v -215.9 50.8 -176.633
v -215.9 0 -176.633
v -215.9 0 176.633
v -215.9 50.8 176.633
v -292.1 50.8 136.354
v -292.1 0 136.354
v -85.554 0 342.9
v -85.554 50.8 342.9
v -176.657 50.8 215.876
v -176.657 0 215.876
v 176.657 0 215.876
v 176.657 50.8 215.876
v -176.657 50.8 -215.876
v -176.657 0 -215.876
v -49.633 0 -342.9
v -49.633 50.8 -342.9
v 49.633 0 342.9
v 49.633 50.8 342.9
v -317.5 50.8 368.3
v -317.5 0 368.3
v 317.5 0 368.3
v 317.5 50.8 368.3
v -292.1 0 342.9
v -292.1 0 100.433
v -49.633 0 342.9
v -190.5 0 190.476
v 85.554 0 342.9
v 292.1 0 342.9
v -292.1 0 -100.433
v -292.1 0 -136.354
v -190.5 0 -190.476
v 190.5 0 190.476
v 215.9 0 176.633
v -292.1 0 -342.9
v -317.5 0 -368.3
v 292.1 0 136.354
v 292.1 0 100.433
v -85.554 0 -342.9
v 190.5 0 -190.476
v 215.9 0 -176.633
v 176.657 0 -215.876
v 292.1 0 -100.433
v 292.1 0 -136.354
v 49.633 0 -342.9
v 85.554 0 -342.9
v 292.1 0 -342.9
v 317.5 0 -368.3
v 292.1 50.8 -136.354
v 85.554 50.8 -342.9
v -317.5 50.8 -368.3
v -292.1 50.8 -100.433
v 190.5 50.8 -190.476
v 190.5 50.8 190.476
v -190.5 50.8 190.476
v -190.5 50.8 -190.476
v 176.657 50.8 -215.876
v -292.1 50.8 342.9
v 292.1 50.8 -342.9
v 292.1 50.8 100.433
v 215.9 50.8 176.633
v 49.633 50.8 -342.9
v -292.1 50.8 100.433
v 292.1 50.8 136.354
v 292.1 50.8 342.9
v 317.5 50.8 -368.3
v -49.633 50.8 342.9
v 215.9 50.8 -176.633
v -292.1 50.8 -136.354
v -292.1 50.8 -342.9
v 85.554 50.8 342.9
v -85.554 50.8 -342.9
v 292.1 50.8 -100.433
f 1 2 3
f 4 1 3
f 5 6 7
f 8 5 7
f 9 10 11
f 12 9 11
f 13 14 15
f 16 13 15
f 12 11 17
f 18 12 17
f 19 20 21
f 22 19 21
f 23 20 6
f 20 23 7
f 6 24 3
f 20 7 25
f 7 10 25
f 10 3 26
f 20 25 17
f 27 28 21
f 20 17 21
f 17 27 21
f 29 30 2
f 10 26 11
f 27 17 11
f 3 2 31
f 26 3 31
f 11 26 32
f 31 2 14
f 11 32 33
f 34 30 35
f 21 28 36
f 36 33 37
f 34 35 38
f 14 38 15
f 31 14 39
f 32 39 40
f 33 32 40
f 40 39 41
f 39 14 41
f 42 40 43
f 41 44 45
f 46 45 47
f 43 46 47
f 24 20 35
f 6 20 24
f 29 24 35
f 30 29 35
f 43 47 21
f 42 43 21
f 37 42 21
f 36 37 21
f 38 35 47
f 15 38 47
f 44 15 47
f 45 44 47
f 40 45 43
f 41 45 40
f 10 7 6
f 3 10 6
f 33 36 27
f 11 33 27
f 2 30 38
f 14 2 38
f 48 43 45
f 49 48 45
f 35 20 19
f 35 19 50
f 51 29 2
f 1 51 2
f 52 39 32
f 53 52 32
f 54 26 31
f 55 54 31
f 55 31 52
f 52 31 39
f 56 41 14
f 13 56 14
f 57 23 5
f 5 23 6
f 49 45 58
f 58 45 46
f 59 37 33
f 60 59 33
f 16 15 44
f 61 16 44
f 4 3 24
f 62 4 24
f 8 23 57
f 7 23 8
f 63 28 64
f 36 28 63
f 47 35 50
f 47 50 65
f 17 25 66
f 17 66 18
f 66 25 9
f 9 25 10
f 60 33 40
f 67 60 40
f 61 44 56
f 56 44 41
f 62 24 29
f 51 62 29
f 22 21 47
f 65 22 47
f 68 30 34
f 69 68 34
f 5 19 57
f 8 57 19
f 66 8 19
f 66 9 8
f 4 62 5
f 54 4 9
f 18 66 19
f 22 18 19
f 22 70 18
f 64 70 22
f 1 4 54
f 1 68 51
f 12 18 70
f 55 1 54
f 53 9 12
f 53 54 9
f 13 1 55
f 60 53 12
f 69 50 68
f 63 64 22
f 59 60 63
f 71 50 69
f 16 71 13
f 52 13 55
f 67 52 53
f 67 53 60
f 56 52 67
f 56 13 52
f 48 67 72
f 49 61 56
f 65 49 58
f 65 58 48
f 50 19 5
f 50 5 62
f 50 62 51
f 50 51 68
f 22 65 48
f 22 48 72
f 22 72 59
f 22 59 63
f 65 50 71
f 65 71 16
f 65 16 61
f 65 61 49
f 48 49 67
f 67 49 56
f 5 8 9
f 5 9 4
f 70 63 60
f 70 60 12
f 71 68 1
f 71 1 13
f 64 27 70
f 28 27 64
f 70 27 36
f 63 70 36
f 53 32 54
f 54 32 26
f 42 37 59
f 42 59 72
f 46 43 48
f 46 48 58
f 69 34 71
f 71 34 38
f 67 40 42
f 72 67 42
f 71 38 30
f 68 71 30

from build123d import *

# Parameters (mm, degrees)
SKETCH1_W           = 635
SKETCH1_H           = 736.6
SKETCH1_W_2         = 584.2
SKETCH1_H_2         = 685.8
BOSS_EXTRUDE1_DEPTH = 50.8


with BuildPart() as part:
    # Sketch1 → Boss-Extrude1 (new body)
    # profile 1 of 13: a face of its own
    with BuildSketch(Plane(origin=(0, 0, 0), x_dir=(1, 0, 0), z_dir=(0, 1, 0))):
        Rectangle(SKETCH1_W, SKETCH1_H)
        Rectangle(SKETCH1_W_2, SKETCH1_H_2, mode=Mode.SUBTRACT)
    # profile 2 of 13: a face of its own
    with BuildSketch(Plane(origin=(0, 0, 0), x_dir=(1, 0, 0), z_dir=(0, 1, 0))):
        Polygon((176.657, -215.876084731), (49.633084731, -342.9), (85.554109215, -342.9), (292.1, -136.354109215), (292.1, -100.433084731), (215.9, -176.633084731), (202.057, -190.476084731), (190.5, -202.033084731), align=None)
    # profile 3 of 13: a face of its own
    with BuildSketch(Plane(origin=(0, 0, 0), x_dir=(1, 0, 0), z_dir=(0, 1, 0))):
        Polygon((85.554109215, 342.9), (49.633084731, 342.9), (176.657, 215.876084731), (190.5, 202.033084731), (202.057, 190.476084731), (215.9, 176.633084731), (292.1, 100.433084731), (292.1, 136.354109215), align=None)
    # profile 4 of 13: a face of its own
    with BuildSketch(Plane(origin=(0, 0, 0), x_dir=(1, 0, 0), z_dir=(0, 1, 0))):
        Polygon((-85.554109215, 342.9), (-292.1, 136.354109215), (-292.1, 100.433084731), (-215.9, 176.633084731), (-202.057, 190.476084731), (-190.5, 202.033084731), (-176.657, 215.876084731), (-49.633084731, 342.9), align=None)
    # profile 5 of 13: a face of its own
    with BuildSketch(Plane(origin=(0, 0, 0), x_dir=(1, 0, 0), z_dir=(0, 1, 0))):
        Polygon((-215.9, -176.633084731), (-292.1, -100.433084731), (-292.1, -136.354109215), (-85.554109215, -342.9), (-49.633084731, -342.9), (-176.657, -215.876084731), (-190.5, -202.033084731), (-202.057, -190.476084731), align=None)
    # profile 6 of 13: a face of its own
    with BuildSketch(Plane(origin=(0, 0, 0), x_dir=(1, 0, 0), z_dir=(0, 1, 0))):
        Polygon((176.657, 215.876084731), (-176.657, 215.876084731), (-190.5, 202.033084731), (-190.5, 190.476084731), (190.5, 190.476084731), (190.5, 202.033084731), align=None)
    # profile 7 of 13: a face of its own
    with BuildSketch(Plane(origin=(0, 0, 0), x_dir=(1, 0, 0), z_dir=(0, 1, 0))):
        Polygon((-202.057, 190.476084731), (-215.9, 176.633084731), (-215.9, -176.633084731), (-202.057, -190.476084731), (-190.5, -190.476084731), (-190.5, 190.476084731), align=None)
    # profile 8 of 13: a face of its own
    with BuildSketch(Plane(origin=(0, 0, 0), x_dir=(1, 0, 0), z_dir=(0, 1, 0))):
        Polygon((202.057, 190.476084731), (190.5, 190.476084731), (190.5, -190.476084731), (202.057, -190.476084731), (215.9, -176.633084731), (215.9, 176.633084731), align=None)
    # profile 9 of 13: a face of its own
    with BuildSketch(Plane(origin=(0, 0, 0), x_dir=(1, 0, 0), z_dir=(0, 1, 0))):
        Polygon((-190.5, -190.476084731), (-190.5, -202.033084731), (-176.657, -215.876084731), (176.657, -215.876084731), (190.5, -202.033084731), (190.5, -190.476084731), align=None)
    # profile 10 of 13: a face of its own
    with BuildSketch(Plane(origin=(0, 0, 0), x_dir=(1, 0, 0), z_dir=(0, 1, 0))):
        Polygon((-190.5, 202.033084731), (-202.057, 190.476084731), (-190.5, 190.476084731), align=None)
    # profile 11 of 13: a face of its own
    with BuildSketch(Plane(origin=(0, 0, 0), x_dir=(1, 0, 0), z_dir=(0, 1, 0))):
        Polygon((-190.5, -190.476084731), (-202.057, -190.476084731), (-190.5, -202.033084731), align=None)
    # profile 12 of 13: a face of its own
    with BuildSketch(Plane(origin=(0, 0, 0), x_dir=(1, 0, 0), z_dir=(0, 1, 0))):
        Polygon((202.057, -190.476084731), (190.5, -190.476084731), (190.5, -202.033084731), align=None)
    # profile 13 of 13: a face of its own
    with BuildSketch(Plane(origin=(0, 0, 0), x_dir=(1, 0, 0), z_dir=(0, 1, 0))):
        Polygon((202.057, 190.476084731), (190.5, 202.033084731), (190.5, 190.476084731), align=None)
    extrude(amount=BOSS_EXTRUDE1_DEPTH)


solid = part.part
